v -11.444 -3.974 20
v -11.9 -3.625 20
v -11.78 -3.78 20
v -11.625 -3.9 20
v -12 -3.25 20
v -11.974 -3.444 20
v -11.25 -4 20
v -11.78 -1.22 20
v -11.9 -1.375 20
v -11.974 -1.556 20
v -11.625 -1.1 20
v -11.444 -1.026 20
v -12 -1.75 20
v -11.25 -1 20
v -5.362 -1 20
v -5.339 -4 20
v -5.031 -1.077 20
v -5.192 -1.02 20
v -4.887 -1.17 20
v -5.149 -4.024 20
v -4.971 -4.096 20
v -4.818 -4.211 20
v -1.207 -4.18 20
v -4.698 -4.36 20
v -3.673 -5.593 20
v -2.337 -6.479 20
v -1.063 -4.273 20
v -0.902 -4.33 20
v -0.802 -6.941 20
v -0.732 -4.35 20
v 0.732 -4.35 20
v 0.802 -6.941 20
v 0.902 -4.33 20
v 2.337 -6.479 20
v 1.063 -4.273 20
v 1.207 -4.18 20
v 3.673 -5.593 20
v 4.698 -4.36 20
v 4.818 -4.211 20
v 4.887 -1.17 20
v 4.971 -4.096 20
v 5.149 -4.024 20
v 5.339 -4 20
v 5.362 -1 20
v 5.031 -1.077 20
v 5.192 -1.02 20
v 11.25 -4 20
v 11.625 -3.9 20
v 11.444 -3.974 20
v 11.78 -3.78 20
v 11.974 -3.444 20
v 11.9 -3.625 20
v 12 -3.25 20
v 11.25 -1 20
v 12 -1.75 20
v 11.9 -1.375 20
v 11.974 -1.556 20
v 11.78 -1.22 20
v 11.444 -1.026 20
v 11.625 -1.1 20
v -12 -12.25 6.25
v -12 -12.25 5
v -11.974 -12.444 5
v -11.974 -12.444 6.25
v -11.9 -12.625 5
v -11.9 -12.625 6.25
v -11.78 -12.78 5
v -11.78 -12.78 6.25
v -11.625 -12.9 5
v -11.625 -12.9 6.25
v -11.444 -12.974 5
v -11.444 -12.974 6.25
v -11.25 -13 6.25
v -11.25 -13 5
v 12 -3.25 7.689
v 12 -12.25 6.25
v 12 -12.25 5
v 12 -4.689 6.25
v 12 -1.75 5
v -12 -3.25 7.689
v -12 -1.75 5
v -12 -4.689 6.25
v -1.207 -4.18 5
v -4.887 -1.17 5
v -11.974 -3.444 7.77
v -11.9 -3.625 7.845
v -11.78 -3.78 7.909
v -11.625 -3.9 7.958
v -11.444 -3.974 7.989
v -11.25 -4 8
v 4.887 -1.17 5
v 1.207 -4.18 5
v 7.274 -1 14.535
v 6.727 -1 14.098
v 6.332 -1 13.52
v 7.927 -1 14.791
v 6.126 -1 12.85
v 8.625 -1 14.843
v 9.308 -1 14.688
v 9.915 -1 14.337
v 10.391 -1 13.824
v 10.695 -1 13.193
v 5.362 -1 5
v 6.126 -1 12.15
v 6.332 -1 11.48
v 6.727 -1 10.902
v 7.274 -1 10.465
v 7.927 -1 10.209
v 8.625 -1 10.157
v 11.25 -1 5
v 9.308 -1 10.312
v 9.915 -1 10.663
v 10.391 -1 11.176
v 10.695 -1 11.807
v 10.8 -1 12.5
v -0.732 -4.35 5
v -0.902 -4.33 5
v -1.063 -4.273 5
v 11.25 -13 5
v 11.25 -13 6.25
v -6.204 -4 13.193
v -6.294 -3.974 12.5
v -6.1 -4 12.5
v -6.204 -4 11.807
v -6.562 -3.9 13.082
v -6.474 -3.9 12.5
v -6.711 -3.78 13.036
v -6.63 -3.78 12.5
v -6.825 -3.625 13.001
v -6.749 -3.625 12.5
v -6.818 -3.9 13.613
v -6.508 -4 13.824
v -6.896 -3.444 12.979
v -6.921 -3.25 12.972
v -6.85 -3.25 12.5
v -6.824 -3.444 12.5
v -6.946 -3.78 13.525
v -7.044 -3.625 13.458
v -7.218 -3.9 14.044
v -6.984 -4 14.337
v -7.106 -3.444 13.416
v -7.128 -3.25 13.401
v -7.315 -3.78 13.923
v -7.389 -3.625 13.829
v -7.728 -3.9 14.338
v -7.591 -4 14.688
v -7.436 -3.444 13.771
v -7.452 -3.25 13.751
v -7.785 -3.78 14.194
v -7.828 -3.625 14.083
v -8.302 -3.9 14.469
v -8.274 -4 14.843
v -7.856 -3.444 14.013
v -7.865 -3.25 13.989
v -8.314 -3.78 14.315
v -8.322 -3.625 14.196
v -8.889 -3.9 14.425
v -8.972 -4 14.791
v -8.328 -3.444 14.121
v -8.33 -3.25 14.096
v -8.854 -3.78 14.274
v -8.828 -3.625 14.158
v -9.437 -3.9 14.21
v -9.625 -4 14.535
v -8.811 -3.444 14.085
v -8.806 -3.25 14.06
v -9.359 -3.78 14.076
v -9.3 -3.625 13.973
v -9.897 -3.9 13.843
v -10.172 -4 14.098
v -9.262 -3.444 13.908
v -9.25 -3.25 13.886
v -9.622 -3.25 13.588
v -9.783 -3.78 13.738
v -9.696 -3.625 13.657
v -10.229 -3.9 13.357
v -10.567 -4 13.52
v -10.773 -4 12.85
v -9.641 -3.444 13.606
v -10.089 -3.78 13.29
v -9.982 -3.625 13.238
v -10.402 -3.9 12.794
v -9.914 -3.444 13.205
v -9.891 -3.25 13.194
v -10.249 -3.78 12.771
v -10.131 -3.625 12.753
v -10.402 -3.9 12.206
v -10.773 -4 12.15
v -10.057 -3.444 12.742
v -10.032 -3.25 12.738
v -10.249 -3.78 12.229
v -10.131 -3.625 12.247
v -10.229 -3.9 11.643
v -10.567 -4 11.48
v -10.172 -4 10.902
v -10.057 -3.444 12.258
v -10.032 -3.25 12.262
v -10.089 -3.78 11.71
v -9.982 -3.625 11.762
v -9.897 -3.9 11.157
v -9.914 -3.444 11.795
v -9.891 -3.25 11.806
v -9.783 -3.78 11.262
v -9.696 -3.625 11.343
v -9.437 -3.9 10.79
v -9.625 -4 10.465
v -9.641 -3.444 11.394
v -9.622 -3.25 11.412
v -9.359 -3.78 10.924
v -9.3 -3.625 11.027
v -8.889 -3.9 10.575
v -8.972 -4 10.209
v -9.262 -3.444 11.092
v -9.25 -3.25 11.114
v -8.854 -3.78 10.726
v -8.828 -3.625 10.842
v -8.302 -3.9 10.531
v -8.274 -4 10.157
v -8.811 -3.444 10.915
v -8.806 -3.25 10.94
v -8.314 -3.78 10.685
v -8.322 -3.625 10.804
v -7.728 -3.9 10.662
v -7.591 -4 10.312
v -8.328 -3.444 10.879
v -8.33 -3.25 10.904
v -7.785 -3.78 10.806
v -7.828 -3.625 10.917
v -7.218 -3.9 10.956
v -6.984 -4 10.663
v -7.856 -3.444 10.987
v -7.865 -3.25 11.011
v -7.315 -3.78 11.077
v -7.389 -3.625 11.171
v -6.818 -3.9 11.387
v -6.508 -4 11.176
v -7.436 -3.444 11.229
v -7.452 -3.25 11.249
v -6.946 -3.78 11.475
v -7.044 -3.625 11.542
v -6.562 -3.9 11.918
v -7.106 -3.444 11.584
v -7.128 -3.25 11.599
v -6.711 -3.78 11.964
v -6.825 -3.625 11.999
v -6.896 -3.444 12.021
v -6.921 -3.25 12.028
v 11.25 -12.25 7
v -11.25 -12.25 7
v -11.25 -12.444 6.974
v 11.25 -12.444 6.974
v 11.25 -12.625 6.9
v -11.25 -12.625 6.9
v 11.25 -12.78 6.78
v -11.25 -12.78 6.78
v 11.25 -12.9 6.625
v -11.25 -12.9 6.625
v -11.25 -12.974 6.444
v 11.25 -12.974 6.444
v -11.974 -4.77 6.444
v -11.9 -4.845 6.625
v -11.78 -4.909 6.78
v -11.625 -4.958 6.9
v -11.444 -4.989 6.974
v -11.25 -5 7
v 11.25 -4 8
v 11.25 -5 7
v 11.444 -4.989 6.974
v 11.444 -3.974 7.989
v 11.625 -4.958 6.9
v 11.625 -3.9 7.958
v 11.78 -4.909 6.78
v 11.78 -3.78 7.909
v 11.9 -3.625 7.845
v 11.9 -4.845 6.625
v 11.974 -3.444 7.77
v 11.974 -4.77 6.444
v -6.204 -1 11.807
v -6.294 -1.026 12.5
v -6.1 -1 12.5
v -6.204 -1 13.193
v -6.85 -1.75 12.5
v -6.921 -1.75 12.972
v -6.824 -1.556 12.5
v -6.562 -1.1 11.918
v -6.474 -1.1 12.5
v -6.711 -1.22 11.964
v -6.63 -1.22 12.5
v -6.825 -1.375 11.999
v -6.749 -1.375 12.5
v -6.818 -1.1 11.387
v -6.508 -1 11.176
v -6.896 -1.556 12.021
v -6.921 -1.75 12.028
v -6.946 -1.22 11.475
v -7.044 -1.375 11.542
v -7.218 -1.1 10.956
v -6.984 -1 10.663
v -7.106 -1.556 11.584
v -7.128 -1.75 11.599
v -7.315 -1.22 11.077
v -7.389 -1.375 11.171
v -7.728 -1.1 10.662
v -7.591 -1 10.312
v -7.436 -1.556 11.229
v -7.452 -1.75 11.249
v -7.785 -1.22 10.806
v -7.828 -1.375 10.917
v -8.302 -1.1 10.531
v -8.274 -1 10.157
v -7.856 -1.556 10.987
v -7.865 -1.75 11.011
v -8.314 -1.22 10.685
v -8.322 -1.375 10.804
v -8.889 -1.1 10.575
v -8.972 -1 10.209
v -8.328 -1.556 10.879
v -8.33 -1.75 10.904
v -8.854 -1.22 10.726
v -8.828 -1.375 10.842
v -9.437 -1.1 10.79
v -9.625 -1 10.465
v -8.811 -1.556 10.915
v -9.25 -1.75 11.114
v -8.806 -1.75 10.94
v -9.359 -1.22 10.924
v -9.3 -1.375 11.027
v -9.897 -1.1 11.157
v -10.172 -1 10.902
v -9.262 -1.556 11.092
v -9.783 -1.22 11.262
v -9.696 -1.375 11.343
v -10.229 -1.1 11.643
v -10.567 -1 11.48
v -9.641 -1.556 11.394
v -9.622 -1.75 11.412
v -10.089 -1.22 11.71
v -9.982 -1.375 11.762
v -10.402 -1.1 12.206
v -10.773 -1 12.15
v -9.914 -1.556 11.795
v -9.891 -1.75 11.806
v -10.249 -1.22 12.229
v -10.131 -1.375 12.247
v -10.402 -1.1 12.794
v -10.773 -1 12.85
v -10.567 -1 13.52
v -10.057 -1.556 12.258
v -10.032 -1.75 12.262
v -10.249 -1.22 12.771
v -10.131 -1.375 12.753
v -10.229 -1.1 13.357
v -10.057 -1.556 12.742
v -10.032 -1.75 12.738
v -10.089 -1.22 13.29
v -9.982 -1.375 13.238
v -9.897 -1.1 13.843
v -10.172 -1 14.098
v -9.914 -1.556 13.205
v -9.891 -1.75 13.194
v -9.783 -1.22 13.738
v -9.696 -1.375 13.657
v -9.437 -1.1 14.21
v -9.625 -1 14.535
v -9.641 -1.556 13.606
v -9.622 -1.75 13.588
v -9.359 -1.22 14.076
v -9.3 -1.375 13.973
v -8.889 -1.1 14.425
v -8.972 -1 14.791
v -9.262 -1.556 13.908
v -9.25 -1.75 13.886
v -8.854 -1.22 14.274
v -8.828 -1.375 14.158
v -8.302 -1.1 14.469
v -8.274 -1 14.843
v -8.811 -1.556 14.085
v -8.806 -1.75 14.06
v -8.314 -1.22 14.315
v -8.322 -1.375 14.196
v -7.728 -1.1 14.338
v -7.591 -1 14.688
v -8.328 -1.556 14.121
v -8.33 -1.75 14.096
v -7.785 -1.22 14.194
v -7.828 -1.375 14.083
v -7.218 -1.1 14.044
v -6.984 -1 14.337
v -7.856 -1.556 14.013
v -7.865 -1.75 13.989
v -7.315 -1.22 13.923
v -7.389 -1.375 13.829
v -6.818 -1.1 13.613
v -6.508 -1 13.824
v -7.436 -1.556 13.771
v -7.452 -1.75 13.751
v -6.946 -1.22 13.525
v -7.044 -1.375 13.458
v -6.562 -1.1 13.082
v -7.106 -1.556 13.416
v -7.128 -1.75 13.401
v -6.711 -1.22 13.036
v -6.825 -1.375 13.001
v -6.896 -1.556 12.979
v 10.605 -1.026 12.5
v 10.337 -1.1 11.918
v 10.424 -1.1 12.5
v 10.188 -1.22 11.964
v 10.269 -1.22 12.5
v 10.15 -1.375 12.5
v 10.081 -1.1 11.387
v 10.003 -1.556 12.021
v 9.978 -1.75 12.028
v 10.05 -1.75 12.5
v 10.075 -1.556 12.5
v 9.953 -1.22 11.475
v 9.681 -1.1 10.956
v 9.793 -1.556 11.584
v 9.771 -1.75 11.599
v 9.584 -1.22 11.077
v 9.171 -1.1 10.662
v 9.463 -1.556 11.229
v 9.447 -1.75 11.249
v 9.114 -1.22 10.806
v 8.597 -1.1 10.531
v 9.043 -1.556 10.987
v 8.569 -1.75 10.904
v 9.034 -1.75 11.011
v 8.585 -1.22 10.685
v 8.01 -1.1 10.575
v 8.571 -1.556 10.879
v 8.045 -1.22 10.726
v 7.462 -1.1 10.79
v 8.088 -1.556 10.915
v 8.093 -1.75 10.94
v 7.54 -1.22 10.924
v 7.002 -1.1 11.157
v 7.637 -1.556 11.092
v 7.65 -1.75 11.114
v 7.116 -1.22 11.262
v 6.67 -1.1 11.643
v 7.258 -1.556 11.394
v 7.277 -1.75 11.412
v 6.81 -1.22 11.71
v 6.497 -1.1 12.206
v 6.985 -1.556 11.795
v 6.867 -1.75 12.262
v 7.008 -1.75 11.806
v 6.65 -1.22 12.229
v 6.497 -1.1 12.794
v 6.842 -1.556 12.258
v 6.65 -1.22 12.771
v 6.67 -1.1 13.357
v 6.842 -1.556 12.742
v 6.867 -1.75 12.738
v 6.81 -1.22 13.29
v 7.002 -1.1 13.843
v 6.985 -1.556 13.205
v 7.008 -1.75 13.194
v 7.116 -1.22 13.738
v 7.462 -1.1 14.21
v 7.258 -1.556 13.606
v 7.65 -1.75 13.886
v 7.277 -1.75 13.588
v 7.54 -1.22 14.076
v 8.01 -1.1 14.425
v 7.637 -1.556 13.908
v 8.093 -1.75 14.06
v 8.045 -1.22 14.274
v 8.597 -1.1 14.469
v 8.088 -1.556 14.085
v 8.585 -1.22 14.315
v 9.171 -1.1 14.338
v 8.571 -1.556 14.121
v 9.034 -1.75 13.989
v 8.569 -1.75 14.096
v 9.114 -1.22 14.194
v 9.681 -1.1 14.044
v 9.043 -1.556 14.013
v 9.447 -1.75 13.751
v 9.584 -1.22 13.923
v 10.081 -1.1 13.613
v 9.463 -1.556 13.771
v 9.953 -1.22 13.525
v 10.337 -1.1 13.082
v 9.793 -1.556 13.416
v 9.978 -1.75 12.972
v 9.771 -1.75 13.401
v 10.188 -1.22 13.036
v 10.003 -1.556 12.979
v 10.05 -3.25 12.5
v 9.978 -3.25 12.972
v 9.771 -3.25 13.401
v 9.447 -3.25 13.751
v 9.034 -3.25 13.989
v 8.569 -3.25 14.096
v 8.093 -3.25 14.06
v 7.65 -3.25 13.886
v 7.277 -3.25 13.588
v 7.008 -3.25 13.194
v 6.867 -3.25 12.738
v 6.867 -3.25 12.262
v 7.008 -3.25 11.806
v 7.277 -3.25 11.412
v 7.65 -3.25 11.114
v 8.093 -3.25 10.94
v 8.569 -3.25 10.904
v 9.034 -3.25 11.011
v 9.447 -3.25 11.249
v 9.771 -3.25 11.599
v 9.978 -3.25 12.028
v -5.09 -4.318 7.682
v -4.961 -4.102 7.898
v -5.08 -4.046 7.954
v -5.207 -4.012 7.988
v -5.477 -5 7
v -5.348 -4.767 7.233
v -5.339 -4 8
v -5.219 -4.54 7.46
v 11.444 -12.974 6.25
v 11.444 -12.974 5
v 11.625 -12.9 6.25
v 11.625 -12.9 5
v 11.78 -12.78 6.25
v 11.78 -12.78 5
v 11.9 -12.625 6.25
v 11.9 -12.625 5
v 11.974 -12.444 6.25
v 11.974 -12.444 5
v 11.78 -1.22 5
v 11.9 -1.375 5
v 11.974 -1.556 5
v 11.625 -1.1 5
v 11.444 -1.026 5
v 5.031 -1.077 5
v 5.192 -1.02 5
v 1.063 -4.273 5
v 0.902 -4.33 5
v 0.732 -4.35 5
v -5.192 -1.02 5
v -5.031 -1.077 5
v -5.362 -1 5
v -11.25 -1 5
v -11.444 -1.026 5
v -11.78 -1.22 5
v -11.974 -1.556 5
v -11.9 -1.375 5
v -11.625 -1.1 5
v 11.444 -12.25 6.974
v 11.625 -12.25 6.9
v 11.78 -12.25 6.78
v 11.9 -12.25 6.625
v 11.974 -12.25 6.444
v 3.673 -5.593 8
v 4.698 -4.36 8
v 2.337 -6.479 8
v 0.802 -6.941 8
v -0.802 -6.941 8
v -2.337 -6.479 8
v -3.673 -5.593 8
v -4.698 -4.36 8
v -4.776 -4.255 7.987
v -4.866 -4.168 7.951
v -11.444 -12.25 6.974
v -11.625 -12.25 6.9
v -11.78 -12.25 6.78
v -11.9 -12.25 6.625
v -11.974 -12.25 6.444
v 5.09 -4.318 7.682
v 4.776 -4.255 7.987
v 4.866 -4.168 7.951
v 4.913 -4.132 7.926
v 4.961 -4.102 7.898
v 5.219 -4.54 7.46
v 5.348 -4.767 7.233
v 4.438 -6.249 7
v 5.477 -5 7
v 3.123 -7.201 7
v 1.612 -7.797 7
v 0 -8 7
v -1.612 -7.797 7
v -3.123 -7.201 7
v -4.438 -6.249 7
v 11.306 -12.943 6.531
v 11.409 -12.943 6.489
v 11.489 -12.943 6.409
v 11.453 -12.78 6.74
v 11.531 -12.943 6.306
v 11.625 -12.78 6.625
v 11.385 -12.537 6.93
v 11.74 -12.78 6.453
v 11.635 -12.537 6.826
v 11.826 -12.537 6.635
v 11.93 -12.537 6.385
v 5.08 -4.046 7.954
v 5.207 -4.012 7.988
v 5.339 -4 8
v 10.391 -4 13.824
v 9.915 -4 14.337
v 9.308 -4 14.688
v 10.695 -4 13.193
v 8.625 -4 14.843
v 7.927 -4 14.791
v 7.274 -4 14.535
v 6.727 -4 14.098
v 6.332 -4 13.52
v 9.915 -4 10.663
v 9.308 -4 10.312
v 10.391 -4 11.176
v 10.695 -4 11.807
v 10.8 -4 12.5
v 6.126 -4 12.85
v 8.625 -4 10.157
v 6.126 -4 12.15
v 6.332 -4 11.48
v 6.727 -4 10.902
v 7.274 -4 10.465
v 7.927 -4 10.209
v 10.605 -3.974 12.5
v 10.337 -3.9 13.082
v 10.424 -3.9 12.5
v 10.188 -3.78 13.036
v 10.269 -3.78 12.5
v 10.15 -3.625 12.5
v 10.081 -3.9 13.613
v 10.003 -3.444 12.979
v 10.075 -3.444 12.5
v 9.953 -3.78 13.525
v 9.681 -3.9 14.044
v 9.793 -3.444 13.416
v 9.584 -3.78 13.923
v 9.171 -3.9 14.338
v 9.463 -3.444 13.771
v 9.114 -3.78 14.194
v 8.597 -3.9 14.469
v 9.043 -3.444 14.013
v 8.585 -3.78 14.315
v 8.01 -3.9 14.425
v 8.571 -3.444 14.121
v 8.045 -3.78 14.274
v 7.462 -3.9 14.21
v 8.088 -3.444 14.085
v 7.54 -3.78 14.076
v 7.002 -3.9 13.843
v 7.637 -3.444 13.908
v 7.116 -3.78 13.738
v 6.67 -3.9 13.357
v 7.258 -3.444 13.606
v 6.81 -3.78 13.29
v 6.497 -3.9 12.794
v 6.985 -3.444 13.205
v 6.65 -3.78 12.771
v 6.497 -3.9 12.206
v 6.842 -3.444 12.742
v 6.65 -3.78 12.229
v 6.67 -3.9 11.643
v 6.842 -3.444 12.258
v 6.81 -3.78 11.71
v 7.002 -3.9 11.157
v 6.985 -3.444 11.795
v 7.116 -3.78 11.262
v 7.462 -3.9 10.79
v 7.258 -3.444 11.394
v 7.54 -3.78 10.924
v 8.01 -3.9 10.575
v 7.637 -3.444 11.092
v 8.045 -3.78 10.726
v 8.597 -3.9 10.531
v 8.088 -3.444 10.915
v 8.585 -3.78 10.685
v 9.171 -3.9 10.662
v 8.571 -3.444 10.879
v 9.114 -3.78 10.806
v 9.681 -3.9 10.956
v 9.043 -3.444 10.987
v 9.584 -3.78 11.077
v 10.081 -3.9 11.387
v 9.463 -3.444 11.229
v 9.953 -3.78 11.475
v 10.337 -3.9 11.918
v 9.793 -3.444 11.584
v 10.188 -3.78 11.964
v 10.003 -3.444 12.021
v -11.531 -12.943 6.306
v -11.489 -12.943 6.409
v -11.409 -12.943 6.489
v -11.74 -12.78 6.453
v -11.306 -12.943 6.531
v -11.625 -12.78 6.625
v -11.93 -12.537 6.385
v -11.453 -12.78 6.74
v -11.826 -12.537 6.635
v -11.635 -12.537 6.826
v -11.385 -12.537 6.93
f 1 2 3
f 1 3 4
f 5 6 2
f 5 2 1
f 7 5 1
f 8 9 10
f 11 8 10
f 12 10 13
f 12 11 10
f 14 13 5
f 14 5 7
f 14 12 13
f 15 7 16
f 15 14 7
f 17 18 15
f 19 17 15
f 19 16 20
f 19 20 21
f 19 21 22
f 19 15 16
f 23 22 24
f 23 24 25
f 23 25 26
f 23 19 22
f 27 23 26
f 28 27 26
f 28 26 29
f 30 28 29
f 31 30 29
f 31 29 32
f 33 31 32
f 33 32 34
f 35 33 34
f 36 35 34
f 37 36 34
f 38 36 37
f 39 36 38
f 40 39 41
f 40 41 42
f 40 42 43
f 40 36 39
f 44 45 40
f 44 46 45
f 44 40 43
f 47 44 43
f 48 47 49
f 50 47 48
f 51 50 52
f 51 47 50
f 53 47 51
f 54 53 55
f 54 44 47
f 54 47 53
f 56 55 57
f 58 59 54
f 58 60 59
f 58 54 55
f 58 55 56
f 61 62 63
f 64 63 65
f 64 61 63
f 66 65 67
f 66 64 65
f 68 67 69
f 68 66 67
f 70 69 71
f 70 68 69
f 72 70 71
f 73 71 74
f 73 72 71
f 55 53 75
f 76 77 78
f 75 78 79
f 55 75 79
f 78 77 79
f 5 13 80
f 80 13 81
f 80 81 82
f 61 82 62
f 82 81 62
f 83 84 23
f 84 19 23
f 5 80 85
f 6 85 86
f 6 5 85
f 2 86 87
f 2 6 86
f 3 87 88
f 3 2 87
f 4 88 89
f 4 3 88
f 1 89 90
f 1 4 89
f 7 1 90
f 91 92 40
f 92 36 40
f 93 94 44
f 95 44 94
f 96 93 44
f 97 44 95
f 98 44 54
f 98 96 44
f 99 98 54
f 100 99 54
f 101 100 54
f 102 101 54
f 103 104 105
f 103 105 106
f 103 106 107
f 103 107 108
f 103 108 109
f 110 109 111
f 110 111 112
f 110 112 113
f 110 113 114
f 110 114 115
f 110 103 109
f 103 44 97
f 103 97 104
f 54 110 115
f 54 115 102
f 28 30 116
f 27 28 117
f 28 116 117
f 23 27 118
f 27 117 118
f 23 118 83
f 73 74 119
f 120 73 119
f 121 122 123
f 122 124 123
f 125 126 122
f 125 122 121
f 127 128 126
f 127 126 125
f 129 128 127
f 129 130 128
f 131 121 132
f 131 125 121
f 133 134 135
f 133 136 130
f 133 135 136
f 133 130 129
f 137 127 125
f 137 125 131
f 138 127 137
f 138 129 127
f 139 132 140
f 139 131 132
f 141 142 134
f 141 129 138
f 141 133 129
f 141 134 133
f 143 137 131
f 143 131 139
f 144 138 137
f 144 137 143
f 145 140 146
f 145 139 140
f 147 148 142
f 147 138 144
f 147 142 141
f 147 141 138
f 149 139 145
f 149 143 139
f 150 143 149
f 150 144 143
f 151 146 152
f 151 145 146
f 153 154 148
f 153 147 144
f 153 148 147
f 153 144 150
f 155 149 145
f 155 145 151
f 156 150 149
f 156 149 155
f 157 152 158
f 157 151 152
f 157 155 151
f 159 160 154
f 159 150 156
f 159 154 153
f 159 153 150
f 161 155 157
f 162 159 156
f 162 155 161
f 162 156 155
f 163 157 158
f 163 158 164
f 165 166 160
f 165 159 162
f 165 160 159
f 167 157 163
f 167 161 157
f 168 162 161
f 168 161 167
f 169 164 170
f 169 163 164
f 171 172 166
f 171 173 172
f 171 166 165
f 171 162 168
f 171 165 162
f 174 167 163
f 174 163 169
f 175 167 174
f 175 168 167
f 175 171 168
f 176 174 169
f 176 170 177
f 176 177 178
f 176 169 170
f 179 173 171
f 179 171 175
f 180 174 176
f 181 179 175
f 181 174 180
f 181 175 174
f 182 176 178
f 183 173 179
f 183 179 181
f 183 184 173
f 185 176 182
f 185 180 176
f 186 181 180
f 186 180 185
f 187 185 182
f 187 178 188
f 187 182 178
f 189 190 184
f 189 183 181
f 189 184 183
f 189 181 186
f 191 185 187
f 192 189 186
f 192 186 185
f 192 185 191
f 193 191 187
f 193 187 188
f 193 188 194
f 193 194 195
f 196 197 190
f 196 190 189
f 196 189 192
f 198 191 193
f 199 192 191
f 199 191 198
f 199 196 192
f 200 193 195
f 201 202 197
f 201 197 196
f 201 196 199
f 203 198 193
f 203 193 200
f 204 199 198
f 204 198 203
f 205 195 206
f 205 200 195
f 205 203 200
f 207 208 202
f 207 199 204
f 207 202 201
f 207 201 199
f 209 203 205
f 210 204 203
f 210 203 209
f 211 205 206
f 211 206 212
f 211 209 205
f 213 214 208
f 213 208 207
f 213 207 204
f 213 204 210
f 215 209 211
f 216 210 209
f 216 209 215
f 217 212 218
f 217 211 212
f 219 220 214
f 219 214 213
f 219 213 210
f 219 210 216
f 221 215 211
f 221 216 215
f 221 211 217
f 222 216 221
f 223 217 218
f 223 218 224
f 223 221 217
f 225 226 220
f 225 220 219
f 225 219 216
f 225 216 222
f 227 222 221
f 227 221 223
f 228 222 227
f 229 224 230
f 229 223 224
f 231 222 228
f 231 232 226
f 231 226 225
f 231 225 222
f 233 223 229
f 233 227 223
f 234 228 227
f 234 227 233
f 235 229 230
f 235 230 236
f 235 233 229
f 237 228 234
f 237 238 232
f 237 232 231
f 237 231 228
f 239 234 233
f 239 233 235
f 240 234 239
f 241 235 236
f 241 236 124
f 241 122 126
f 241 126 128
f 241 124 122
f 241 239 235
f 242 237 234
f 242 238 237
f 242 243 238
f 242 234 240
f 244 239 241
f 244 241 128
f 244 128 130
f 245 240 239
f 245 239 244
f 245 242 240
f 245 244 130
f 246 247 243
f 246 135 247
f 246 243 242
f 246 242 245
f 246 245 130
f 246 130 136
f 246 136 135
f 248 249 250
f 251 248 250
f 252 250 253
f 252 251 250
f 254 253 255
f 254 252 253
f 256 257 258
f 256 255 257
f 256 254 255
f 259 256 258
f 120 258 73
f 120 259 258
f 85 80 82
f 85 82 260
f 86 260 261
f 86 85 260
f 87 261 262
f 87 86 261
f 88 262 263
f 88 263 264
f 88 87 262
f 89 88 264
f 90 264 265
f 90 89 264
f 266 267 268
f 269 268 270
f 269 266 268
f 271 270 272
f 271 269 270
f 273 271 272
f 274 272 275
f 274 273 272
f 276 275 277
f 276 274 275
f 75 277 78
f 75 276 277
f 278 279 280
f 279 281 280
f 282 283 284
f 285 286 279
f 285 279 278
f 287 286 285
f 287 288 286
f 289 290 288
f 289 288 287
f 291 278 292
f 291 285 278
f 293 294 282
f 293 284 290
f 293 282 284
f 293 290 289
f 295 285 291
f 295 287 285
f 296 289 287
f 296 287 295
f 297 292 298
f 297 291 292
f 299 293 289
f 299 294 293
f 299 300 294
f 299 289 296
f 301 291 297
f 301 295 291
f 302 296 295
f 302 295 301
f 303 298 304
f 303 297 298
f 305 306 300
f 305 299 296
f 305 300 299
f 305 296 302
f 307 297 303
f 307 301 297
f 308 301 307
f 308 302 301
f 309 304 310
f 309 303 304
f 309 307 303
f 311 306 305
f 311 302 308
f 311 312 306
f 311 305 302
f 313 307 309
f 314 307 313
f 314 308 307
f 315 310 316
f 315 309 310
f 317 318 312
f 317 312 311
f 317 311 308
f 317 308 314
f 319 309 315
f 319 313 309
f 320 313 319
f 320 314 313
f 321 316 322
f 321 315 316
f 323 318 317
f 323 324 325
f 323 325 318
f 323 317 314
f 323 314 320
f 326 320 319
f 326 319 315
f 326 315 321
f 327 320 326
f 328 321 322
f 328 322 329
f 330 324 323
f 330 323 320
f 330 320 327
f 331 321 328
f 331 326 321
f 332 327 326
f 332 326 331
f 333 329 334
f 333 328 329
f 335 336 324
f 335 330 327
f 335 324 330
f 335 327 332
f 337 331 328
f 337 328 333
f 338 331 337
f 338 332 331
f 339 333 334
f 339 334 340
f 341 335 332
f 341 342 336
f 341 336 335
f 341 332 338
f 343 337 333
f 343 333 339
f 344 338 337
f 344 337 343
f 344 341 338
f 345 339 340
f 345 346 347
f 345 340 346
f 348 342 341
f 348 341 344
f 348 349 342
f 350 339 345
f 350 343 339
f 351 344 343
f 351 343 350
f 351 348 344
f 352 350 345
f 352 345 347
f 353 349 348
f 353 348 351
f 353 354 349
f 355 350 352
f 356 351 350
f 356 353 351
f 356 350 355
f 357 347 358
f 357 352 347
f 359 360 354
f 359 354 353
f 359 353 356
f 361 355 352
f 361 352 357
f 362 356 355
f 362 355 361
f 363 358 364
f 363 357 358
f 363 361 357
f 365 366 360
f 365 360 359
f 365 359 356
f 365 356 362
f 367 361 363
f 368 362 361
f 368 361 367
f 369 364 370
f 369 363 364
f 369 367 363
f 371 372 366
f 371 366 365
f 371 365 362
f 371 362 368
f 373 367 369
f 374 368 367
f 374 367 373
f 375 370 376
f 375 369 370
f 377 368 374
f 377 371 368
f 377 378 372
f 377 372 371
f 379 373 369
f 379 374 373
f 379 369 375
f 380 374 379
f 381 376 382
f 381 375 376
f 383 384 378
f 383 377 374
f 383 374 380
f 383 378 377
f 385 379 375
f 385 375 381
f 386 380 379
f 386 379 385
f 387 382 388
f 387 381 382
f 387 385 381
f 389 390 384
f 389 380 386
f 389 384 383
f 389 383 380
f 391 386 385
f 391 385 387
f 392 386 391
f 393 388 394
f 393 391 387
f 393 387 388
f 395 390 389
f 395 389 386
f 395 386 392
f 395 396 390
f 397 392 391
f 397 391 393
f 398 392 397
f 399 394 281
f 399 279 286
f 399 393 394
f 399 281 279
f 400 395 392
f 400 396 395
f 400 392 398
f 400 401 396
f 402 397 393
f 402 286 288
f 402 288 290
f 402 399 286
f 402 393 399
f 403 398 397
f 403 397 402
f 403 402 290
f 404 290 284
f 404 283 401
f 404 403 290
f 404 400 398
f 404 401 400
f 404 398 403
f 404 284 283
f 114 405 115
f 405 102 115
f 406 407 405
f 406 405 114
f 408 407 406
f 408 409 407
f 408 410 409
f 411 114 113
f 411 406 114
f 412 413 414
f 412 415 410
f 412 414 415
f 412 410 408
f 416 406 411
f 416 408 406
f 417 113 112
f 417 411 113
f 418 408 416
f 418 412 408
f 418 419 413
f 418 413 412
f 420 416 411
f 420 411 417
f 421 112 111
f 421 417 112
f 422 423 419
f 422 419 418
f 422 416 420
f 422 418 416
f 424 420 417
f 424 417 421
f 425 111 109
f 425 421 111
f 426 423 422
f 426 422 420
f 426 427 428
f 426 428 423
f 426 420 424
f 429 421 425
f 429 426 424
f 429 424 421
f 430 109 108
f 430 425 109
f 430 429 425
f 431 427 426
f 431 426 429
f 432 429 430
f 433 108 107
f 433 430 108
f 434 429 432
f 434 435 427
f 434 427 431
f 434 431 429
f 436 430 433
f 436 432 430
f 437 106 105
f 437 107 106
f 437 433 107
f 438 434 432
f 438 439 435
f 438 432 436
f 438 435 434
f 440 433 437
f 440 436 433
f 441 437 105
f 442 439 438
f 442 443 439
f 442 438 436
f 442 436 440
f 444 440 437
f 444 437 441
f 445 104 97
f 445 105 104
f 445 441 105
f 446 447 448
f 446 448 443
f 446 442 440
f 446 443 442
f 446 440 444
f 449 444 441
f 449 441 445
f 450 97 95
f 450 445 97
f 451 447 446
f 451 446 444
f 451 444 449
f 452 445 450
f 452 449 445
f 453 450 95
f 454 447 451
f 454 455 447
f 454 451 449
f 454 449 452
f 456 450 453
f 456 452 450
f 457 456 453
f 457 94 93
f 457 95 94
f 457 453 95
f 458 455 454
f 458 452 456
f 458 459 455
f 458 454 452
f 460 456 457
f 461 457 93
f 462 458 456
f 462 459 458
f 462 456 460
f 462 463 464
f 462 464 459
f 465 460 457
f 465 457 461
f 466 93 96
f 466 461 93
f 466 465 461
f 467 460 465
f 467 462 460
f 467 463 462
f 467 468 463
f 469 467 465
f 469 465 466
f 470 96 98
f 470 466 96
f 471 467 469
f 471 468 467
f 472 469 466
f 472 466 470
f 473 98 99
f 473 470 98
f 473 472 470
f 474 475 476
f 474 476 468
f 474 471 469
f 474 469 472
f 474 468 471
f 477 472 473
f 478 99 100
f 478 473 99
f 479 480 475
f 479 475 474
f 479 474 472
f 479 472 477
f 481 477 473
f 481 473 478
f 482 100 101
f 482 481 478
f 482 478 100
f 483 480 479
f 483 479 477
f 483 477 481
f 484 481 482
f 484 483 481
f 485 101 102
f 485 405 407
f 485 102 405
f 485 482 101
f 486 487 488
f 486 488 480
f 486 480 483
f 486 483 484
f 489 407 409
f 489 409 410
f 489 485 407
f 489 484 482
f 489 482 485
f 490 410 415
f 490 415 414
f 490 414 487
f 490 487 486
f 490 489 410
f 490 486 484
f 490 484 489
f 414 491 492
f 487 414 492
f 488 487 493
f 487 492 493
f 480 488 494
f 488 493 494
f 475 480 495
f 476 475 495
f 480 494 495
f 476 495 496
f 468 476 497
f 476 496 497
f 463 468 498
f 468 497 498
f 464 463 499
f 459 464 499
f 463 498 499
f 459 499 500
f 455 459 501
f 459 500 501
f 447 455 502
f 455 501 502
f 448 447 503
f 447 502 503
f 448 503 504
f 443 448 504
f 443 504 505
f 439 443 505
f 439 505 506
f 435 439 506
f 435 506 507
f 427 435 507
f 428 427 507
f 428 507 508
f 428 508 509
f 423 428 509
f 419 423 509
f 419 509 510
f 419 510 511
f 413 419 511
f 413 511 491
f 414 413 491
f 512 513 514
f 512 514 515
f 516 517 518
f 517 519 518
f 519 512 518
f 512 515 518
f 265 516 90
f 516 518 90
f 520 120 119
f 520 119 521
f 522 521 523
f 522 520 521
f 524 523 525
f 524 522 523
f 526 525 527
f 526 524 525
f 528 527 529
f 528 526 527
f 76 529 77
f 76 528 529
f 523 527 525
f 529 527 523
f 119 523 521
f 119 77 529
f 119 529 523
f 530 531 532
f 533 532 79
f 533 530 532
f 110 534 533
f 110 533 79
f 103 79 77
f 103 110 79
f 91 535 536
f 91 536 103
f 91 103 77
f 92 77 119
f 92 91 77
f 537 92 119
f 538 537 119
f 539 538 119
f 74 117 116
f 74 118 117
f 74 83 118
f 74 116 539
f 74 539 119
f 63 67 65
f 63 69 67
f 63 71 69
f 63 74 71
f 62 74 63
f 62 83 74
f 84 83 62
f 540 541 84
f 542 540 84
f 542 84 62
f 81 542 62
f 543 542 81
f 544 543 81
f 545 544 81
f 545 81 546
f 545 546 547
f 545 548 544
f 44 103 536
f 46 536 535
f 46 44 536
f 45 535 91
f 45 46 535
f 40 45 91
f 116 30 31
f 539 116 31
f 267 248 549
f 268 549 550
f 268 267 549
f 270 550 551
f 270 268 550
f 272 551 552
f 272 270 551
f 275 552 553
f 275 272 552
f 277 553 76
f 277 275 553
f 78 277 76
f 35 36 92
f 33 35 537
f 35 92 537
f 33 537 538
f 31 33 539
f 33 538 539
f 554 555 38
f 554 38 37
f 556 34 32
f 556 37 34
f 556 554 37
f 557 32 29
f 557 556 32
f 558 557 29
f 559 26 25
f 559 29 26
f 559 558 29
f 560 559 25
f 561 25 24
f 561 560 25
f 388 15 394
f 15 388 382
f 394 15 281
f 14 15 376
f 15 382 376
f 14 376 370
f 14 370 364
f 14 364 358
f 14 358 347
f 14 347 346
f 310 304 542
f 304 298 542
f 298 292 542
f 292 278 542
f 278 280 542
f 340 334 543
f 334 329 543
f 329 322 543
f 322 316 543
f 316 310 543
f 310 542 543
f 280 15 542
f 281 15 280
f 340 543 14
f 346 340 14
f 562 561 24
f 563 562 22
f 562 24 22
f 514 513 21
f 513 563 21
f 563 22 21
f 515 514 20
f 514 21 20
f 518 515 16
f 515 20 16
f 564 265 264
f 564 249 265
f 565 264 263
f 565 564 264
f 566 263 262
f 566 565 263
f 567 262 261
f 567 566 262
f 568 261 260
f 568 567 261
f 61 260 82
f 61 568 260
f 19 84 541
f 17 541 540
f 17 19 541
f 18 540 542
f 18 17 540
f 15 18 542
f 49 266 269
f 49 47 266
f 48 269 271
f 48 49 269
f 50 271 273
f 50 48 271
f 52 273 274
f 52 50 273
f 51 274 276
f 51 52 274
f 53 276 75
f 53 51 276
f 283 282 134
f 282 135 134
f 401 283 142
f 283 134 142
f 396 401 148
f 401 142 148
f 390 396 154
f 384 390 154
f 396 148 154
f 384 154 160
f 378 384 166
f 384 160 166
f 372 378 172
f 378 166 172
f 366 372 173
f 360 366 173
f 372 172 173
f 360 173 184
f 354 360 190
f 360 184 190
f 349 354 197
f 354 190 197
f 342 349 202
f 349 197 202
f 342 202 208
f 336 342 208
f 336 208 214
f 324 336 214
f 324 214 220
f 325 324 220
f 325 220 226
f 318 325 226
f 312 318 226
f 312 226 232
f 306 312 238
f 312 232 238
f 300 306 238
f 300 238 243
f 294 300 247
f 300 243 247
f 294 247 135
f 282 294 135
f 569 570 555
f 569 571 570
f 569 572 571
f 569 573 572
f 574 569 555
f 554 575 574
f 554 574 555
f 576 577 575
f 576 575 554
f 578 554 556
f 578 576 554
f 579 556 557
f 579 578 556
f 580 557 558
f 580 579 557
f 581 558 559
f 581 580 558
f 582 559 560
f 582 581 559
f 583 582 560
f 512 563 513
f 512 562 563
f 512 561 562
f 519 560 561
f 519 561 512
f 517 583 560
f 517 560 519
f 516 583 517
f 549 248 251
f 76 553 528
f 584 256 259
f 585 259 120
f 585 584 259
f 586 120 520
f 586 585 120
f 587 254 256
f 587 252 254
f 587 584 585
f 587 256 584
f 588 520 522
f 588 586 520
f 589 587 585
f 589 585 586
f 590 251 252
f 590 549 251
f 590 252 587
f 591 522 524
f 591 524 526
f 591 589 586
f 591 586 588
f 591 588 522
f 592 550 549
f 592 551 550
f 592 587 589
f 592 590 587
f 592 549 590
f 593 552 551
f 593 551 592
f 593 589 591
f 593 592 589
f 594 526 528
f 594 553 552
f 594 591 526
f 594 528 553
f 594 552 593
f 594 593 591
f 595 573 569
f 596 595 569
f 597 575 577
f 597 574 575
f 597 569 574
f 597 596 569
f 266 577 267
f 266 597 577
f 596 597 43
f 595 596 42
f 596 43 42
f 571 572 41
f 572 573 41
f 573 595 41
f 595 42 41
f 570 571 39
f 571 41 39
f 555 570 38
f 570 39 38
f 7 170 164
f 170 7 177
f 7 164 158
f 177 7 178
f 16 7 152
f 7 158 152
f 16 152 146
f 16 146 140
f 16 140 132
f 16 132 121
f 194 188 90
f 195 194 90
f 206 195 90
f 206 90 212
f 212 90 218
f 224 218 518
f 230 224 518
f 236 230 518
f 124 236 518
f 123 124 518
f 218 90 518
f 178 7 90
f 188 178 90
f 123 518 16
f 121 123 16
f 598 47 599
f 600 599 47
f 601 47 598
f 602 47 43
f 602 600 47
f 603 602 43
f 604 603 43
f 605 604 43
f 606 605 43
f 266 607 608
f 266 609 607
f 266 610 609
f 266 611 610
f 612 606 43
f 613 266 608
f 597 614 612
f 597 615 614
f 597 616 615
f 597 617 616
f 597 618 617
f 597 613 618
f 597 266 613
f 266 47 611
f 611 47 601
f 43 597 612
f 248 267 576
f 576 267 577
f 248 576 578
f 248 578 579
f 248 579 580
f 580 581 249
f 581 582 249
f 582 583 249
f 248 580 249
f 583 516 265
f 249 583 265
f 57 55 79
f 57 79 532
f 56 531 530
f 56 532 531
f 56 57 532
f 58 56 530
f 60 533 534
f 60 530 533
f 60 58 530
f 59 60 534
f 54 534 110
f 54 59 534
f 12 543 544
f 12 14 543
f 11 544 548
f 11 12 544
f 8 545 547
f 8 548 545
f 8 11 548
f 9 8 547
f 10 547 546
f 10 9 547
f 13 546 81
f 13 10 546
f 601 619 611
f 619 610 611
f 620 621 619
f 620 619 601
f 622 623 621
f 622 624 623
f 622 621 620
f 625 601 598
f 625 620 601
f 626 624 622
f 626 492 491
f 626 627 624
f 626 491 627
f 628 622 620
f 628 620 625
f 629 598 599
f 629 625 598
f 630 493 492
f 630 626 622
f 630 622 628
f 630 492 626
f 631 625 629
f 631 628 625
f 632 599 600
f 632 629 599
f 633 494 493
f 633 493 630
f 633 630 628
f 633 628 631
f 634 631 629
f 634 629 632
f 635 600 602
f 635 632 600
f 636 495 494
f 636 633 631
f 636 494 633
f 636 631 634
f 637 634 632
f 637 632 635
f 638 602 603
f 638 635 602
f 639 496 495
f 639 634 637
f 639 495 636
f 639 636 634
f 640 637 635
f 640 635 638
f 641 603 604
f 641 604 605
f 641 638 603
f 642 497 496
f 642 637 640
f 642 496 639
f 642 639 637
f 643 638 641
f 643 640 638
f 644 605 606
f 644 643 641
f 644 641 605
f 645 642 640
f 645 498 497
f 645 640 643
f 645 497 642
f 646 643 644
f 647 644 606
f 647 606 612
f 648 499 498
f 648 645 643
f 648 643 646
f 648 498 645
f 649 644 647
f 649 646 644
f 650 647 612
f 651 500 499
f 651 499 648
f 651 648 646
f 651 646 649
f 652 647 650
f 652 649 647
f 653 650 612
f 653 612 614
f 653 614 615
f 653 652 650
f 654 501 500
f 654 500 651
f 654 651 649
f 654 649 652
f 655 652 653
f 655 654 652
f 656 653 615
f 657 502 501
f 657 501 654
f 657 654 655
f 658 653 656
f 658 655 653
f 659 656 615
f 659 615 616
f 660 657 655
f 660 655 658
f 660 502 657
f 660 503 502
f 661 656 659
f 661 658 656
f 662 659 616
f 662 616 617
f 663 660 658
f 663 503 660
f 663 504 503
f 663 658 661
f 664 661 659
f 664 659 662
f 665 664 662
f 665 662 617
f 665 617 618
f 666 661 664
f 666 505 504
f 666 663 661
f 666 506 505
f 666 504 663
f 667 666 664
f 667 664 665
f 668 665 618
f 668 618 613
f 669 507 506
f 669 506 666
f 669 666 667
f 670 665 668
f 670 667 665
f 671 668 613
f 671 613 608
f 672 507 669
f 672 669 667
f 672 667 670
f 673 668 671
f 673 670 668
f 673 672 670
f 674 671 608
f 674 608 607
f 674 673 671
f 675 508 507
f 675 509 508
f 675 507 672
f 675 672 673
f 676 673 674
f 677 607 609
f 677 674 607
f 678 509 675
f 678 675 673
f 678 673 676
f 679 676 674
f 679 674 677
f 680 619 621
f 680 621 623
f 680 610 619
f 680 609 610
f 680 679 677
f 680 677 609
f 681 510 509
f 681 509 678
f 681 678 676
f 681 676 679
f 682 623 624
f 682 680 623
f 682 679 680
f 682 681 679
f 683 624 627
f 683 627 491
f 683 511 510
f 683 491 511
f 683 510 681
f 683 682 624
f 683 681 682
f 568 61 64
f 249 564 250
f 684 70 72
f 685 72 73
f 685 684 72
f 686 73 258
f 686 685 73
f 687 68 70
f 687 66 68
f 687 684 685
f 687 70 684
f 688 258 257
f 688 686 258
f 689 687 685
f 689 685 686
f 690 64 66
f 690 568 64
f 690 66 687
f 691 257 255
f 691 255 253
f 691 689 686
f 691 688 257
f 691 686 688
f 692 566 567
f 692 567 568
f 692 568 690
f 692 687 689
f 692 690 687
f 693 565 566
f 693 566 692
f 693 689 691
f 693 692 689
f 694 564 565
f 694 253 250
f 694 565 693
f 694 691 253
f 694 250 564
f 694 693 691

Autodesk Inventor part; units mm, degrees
ref_plane "YZ Plane" through (0, 0, 0) normal (1, 0, 0) x (0, 1, 0)
ref_plane "XZ Plane" through (0, 0, 0) normal (0, 1, 0) x (-1, 0, 0)
ref_plane "XY Plane" through (0, 0, 0) normal (0, 0, 1) x (1, 0, 0)
sketch "Sketch1" plane through (0, 0, 0) normal (0, 0, 1) x (1, 0, 0)
  line L0 (-10, -12.5) -> (10, -12.5) construction
  line L1 (10, -12.5) -> (10, 12.5) construction
  line L2 (10, 12.5) -> (-10, 12.5) construction
  line L3 (-10, 12.5) -> (-10, -12.5) construction
  line L4 (-10, -12.5) -> (10, 12.5) construction
  line L5 (10, -12.5) -> (-10, 12.5) construction
  circle A0 centre (-10, 12.5) radius 1.925
  circle A1 centre (10, 12.5) radius 1.925
  circle A2 centre (10, -12.5) radius 1.925
  circle A3 centre (-10, -12.5) radius 1.925
  arc A4 (-7.1685, 17.7046) -> (-15.1908, 9.6432) centre (-10, 12.5) ccw
  arc A5 (15.1908, 9.6432) -> (7.1685, 17.7046) centre (10, 12.5) ccw
  arc A6 (7.1685, -17.7046) -> (15.1908, -9.6432) centre (10, -12.5) ccw
  arc A7 (-15.1908, -9.6432) -> (-7.1685, -17.7046) centre (-10, -12.5) ccw
  arc A8 (-7.1685, 17.7046) -> (7.1685, 17.7046) centre (0, 30.8808) ccw
  arc A9 (7.1685, -17.7046) -> (-7.1685, -17.7046) centre (0, -30.8808) ccw
  arc A10 (15.1908, 9.6432) -> (15.1908, -9.6432) centre (32.7125, 0) ccw
  arc A11 (-15.1908, -9.6432) -> (-15.1908, 9.6432) centre (-32.7125, 0) ccw
  point P0 (0, 0)
  dimension "d0" = 25
  dimension "d1" = 20
  dimension "d2" = 3.85
  dimension "d3" = 4
  dimension "d4" = 15
  dimension "d5" = 20
extrude "Extrusion1" add sketch "Sketch1" along normal blind 5
sketch "Sketch2" plane through (0, 0, 5) normal (0, 0, 1) x (1, 0, 0)
  circle A0 centre (0, 0) radius 4 construction
  line L0 (-1, -4.35) -> (1, -4.35)
  line L1 (1, -4.35) -> (5.0946, -1)
  line L2 (5.0946, -1) -> (12, -1)
  line L3 (-1, -4.35) -> (-5.0946, -1)
  line L4 (-5.0946, -1) -> (-12, -1)
  line L5 (0, 0) -> (0, -4.35) construction
  line L6 (-12, -1) -> (-12, -4)
  line L7 (-12, -4) -> (-4.899, -4)
  line L8 (12, -1) -> (12, -4)
  line L9 (12, -4) -> (4.899, -4)
  arc A1 (-4.899, -4) -> (4.899, -4) centre (0, -1.5) ccw
  dimension "d8" = 8
  dimension "d9" = 1
  dimension "d10" = 3
  dimension "d11" = 24
  dimension "d12" = 2
  dimension "d13" = 3.35
  dimension "d14" = 5.5
  dimension "d15" = 2.5
extrude "Extrusion2" add sketch "Sketch2" along normal blind 15
sketch "Sketch3" plane through (4.899, -4, 5) normal (0, -1, 0) x (1, 0, 0)
  line L0 (7.101, 0) -> (0, 0) projected
  line L1 (7.101, 0) -> (7.101, 15) projected
  line L2 (0, 0) -> (0, 15) projected
  circle A0 centre (3.5505, 7.5) radius 1.6
  circle A1 centre (-13.3485, 7.5) radius 1.6
  line L3 (3.5505, 0) -> (3.5505, 7.5) construction
  line L4 (3.5505, 7.5) -> (7.101, 7.5) construction
  line L5 (-16.899, 7.5) -> (-13.3485, 7.5) construction
  line L6 (-13.3485, 7.5) -> (-13.3485, 0) construction
  line L7 (-16.899, 0) -> (-16.899, 15) projected
  point P0 (-4.899, -5)
  dimension "d18" = 3.2
extrude "Extrusion3" cut sketch "Sketch3" against normal blind 15
sketch "Sketch4" plane through (0, 0, 5) normal (0, 0, 1) x (1, 0, 0)
  line L0 (1, -4.35) -> (5.0946, -1) projected
  line L1 (-5.0946, -1) -> (-1, -4.35) projected
  line L2 (-1, -4.35) -> (1, -4.35) projected
  line L3 (-5.0946, -1) -> (-1, -4.35)
  line L4 (-1, -4.35) -> (1, -4.35)
  line L5 (1, -4.35) -> (5.0946, -1)
  line L6 (5.0946, 21.1209) -> (-5.0946, 21.1209)
  line L7 (-5.0946, 21.1209) -> (-5.0946, -1)
  line L8 (5.0946, -1) -> (5.0946, 21.1209)
  point P0 (0, 0)
extrude "Extrusion4" cut sketch "Sketch4" against normal blind 10
sketch "Sketch5" plane through (-12, -1, 20) normal (0, 1, 0) x (1, 0, 0)
  line L0 (0, 15) -> (6.9054, 15) projected
  line L1 (-11.2791, 15) -> (33.3469, 15)
  line L2 (33.3469, 15) -> (33.3469, 24.5778)
  line L3 (33.3469, 24.5778) -> (-11.2791, 24.5778)
  line L4 (-11.2791, 24.5778) -> (-11.2791, 15)
  point P0 (12, 20)
extrude "Extrusion5" cut sketch "Sketch5" against normal blind 25.875 and the other way blind 28.8125
sketch "Sketch6" plane through (-5.0946, -1, 5) normal (0, 0, -1) x (-1, 0, 0)
  line L0 (-10.1893, 0) -> (-6.0946, -3.35) projected
  line L1 (-10.1893, 0) -> (-17.0946, 0) projected
  line L2 (-17.0946, 0) -> (-17.0946, -3) projected
  line L3 (-17.0946, -3) -> (-9.9936, -3) projected
  arc A0 (-9.9936, -3) -> (-0.1957, -3) centre (-5.0946, -0.5) ccw projected
  line L4 (-0.1957, -3) -> (6.9054, -3) projected
  line L5 (6.9054, -3) -> (6.9054, 0) projected
  line L6 (6.9054, 0) -> (0, 0) projected
  line L7 (-4.0946, -3.35) -> (0, 0) projected
  line L8 (-6.0946, -3.35) -> (-4.0946, -3.35) projected
  line L9 (-17.0946, 0) -> (-10.1893, 0)
  line L10 (-6.0946, -3.35) -> (-10.1893, 0)
  line L11 (-6.0946, -3.35) -> (-4.0946, -3.35)
  line L12 (-4.0946, -3.35) -> (0, 0)
  line L13 (0, 0) -> (6.9054, 0)
  line L14 (6.9054, 0) -> (6.9054, -12)
  line L15 (6.9054, -12) -> (-17.0946, -12)
  line L16 (-17.0946, -12) -> (-17.0946, 0)
  point P0 (-5.0946, 1)
  dimension "d36" = 12
extrude "Extrusion6" add sketch "Sketch6" against normal blind 2 contours L3 A0 L4 L14 L15 L16
chamfer "Chamfer2" distance 1 angle 45 3 edges at (-8.4495, -4, 7) (0, -7, 7) (8.4495, -4, 7)
fillet "Fillet6" radius 0.75 21 edges at (12, -4, 14) (12, -1, 12.5) (-12, -4, 14) (-12, -1, 12.5) (-4.899, -4, 14) (4.899, -4, 14) (5.0946, -1, 12.5) (1, -4.35, 12.5) (-1, -4.35, 12.5) (-5.0946, -1, 12.5) (6.8495, -4, 12.5) (6.8495, -1, 12.5) (-10.0495, -4, 12.5) (-10.0495, -1, 12.5) (-12, -4.5, 7.5) (-12, -9, 7) (12, -4.5, 7.5) (12, -9, 7) (0, -13, 7) (12, -13, 6) (-12, -13, 6)
properties part number "rodClamp"
